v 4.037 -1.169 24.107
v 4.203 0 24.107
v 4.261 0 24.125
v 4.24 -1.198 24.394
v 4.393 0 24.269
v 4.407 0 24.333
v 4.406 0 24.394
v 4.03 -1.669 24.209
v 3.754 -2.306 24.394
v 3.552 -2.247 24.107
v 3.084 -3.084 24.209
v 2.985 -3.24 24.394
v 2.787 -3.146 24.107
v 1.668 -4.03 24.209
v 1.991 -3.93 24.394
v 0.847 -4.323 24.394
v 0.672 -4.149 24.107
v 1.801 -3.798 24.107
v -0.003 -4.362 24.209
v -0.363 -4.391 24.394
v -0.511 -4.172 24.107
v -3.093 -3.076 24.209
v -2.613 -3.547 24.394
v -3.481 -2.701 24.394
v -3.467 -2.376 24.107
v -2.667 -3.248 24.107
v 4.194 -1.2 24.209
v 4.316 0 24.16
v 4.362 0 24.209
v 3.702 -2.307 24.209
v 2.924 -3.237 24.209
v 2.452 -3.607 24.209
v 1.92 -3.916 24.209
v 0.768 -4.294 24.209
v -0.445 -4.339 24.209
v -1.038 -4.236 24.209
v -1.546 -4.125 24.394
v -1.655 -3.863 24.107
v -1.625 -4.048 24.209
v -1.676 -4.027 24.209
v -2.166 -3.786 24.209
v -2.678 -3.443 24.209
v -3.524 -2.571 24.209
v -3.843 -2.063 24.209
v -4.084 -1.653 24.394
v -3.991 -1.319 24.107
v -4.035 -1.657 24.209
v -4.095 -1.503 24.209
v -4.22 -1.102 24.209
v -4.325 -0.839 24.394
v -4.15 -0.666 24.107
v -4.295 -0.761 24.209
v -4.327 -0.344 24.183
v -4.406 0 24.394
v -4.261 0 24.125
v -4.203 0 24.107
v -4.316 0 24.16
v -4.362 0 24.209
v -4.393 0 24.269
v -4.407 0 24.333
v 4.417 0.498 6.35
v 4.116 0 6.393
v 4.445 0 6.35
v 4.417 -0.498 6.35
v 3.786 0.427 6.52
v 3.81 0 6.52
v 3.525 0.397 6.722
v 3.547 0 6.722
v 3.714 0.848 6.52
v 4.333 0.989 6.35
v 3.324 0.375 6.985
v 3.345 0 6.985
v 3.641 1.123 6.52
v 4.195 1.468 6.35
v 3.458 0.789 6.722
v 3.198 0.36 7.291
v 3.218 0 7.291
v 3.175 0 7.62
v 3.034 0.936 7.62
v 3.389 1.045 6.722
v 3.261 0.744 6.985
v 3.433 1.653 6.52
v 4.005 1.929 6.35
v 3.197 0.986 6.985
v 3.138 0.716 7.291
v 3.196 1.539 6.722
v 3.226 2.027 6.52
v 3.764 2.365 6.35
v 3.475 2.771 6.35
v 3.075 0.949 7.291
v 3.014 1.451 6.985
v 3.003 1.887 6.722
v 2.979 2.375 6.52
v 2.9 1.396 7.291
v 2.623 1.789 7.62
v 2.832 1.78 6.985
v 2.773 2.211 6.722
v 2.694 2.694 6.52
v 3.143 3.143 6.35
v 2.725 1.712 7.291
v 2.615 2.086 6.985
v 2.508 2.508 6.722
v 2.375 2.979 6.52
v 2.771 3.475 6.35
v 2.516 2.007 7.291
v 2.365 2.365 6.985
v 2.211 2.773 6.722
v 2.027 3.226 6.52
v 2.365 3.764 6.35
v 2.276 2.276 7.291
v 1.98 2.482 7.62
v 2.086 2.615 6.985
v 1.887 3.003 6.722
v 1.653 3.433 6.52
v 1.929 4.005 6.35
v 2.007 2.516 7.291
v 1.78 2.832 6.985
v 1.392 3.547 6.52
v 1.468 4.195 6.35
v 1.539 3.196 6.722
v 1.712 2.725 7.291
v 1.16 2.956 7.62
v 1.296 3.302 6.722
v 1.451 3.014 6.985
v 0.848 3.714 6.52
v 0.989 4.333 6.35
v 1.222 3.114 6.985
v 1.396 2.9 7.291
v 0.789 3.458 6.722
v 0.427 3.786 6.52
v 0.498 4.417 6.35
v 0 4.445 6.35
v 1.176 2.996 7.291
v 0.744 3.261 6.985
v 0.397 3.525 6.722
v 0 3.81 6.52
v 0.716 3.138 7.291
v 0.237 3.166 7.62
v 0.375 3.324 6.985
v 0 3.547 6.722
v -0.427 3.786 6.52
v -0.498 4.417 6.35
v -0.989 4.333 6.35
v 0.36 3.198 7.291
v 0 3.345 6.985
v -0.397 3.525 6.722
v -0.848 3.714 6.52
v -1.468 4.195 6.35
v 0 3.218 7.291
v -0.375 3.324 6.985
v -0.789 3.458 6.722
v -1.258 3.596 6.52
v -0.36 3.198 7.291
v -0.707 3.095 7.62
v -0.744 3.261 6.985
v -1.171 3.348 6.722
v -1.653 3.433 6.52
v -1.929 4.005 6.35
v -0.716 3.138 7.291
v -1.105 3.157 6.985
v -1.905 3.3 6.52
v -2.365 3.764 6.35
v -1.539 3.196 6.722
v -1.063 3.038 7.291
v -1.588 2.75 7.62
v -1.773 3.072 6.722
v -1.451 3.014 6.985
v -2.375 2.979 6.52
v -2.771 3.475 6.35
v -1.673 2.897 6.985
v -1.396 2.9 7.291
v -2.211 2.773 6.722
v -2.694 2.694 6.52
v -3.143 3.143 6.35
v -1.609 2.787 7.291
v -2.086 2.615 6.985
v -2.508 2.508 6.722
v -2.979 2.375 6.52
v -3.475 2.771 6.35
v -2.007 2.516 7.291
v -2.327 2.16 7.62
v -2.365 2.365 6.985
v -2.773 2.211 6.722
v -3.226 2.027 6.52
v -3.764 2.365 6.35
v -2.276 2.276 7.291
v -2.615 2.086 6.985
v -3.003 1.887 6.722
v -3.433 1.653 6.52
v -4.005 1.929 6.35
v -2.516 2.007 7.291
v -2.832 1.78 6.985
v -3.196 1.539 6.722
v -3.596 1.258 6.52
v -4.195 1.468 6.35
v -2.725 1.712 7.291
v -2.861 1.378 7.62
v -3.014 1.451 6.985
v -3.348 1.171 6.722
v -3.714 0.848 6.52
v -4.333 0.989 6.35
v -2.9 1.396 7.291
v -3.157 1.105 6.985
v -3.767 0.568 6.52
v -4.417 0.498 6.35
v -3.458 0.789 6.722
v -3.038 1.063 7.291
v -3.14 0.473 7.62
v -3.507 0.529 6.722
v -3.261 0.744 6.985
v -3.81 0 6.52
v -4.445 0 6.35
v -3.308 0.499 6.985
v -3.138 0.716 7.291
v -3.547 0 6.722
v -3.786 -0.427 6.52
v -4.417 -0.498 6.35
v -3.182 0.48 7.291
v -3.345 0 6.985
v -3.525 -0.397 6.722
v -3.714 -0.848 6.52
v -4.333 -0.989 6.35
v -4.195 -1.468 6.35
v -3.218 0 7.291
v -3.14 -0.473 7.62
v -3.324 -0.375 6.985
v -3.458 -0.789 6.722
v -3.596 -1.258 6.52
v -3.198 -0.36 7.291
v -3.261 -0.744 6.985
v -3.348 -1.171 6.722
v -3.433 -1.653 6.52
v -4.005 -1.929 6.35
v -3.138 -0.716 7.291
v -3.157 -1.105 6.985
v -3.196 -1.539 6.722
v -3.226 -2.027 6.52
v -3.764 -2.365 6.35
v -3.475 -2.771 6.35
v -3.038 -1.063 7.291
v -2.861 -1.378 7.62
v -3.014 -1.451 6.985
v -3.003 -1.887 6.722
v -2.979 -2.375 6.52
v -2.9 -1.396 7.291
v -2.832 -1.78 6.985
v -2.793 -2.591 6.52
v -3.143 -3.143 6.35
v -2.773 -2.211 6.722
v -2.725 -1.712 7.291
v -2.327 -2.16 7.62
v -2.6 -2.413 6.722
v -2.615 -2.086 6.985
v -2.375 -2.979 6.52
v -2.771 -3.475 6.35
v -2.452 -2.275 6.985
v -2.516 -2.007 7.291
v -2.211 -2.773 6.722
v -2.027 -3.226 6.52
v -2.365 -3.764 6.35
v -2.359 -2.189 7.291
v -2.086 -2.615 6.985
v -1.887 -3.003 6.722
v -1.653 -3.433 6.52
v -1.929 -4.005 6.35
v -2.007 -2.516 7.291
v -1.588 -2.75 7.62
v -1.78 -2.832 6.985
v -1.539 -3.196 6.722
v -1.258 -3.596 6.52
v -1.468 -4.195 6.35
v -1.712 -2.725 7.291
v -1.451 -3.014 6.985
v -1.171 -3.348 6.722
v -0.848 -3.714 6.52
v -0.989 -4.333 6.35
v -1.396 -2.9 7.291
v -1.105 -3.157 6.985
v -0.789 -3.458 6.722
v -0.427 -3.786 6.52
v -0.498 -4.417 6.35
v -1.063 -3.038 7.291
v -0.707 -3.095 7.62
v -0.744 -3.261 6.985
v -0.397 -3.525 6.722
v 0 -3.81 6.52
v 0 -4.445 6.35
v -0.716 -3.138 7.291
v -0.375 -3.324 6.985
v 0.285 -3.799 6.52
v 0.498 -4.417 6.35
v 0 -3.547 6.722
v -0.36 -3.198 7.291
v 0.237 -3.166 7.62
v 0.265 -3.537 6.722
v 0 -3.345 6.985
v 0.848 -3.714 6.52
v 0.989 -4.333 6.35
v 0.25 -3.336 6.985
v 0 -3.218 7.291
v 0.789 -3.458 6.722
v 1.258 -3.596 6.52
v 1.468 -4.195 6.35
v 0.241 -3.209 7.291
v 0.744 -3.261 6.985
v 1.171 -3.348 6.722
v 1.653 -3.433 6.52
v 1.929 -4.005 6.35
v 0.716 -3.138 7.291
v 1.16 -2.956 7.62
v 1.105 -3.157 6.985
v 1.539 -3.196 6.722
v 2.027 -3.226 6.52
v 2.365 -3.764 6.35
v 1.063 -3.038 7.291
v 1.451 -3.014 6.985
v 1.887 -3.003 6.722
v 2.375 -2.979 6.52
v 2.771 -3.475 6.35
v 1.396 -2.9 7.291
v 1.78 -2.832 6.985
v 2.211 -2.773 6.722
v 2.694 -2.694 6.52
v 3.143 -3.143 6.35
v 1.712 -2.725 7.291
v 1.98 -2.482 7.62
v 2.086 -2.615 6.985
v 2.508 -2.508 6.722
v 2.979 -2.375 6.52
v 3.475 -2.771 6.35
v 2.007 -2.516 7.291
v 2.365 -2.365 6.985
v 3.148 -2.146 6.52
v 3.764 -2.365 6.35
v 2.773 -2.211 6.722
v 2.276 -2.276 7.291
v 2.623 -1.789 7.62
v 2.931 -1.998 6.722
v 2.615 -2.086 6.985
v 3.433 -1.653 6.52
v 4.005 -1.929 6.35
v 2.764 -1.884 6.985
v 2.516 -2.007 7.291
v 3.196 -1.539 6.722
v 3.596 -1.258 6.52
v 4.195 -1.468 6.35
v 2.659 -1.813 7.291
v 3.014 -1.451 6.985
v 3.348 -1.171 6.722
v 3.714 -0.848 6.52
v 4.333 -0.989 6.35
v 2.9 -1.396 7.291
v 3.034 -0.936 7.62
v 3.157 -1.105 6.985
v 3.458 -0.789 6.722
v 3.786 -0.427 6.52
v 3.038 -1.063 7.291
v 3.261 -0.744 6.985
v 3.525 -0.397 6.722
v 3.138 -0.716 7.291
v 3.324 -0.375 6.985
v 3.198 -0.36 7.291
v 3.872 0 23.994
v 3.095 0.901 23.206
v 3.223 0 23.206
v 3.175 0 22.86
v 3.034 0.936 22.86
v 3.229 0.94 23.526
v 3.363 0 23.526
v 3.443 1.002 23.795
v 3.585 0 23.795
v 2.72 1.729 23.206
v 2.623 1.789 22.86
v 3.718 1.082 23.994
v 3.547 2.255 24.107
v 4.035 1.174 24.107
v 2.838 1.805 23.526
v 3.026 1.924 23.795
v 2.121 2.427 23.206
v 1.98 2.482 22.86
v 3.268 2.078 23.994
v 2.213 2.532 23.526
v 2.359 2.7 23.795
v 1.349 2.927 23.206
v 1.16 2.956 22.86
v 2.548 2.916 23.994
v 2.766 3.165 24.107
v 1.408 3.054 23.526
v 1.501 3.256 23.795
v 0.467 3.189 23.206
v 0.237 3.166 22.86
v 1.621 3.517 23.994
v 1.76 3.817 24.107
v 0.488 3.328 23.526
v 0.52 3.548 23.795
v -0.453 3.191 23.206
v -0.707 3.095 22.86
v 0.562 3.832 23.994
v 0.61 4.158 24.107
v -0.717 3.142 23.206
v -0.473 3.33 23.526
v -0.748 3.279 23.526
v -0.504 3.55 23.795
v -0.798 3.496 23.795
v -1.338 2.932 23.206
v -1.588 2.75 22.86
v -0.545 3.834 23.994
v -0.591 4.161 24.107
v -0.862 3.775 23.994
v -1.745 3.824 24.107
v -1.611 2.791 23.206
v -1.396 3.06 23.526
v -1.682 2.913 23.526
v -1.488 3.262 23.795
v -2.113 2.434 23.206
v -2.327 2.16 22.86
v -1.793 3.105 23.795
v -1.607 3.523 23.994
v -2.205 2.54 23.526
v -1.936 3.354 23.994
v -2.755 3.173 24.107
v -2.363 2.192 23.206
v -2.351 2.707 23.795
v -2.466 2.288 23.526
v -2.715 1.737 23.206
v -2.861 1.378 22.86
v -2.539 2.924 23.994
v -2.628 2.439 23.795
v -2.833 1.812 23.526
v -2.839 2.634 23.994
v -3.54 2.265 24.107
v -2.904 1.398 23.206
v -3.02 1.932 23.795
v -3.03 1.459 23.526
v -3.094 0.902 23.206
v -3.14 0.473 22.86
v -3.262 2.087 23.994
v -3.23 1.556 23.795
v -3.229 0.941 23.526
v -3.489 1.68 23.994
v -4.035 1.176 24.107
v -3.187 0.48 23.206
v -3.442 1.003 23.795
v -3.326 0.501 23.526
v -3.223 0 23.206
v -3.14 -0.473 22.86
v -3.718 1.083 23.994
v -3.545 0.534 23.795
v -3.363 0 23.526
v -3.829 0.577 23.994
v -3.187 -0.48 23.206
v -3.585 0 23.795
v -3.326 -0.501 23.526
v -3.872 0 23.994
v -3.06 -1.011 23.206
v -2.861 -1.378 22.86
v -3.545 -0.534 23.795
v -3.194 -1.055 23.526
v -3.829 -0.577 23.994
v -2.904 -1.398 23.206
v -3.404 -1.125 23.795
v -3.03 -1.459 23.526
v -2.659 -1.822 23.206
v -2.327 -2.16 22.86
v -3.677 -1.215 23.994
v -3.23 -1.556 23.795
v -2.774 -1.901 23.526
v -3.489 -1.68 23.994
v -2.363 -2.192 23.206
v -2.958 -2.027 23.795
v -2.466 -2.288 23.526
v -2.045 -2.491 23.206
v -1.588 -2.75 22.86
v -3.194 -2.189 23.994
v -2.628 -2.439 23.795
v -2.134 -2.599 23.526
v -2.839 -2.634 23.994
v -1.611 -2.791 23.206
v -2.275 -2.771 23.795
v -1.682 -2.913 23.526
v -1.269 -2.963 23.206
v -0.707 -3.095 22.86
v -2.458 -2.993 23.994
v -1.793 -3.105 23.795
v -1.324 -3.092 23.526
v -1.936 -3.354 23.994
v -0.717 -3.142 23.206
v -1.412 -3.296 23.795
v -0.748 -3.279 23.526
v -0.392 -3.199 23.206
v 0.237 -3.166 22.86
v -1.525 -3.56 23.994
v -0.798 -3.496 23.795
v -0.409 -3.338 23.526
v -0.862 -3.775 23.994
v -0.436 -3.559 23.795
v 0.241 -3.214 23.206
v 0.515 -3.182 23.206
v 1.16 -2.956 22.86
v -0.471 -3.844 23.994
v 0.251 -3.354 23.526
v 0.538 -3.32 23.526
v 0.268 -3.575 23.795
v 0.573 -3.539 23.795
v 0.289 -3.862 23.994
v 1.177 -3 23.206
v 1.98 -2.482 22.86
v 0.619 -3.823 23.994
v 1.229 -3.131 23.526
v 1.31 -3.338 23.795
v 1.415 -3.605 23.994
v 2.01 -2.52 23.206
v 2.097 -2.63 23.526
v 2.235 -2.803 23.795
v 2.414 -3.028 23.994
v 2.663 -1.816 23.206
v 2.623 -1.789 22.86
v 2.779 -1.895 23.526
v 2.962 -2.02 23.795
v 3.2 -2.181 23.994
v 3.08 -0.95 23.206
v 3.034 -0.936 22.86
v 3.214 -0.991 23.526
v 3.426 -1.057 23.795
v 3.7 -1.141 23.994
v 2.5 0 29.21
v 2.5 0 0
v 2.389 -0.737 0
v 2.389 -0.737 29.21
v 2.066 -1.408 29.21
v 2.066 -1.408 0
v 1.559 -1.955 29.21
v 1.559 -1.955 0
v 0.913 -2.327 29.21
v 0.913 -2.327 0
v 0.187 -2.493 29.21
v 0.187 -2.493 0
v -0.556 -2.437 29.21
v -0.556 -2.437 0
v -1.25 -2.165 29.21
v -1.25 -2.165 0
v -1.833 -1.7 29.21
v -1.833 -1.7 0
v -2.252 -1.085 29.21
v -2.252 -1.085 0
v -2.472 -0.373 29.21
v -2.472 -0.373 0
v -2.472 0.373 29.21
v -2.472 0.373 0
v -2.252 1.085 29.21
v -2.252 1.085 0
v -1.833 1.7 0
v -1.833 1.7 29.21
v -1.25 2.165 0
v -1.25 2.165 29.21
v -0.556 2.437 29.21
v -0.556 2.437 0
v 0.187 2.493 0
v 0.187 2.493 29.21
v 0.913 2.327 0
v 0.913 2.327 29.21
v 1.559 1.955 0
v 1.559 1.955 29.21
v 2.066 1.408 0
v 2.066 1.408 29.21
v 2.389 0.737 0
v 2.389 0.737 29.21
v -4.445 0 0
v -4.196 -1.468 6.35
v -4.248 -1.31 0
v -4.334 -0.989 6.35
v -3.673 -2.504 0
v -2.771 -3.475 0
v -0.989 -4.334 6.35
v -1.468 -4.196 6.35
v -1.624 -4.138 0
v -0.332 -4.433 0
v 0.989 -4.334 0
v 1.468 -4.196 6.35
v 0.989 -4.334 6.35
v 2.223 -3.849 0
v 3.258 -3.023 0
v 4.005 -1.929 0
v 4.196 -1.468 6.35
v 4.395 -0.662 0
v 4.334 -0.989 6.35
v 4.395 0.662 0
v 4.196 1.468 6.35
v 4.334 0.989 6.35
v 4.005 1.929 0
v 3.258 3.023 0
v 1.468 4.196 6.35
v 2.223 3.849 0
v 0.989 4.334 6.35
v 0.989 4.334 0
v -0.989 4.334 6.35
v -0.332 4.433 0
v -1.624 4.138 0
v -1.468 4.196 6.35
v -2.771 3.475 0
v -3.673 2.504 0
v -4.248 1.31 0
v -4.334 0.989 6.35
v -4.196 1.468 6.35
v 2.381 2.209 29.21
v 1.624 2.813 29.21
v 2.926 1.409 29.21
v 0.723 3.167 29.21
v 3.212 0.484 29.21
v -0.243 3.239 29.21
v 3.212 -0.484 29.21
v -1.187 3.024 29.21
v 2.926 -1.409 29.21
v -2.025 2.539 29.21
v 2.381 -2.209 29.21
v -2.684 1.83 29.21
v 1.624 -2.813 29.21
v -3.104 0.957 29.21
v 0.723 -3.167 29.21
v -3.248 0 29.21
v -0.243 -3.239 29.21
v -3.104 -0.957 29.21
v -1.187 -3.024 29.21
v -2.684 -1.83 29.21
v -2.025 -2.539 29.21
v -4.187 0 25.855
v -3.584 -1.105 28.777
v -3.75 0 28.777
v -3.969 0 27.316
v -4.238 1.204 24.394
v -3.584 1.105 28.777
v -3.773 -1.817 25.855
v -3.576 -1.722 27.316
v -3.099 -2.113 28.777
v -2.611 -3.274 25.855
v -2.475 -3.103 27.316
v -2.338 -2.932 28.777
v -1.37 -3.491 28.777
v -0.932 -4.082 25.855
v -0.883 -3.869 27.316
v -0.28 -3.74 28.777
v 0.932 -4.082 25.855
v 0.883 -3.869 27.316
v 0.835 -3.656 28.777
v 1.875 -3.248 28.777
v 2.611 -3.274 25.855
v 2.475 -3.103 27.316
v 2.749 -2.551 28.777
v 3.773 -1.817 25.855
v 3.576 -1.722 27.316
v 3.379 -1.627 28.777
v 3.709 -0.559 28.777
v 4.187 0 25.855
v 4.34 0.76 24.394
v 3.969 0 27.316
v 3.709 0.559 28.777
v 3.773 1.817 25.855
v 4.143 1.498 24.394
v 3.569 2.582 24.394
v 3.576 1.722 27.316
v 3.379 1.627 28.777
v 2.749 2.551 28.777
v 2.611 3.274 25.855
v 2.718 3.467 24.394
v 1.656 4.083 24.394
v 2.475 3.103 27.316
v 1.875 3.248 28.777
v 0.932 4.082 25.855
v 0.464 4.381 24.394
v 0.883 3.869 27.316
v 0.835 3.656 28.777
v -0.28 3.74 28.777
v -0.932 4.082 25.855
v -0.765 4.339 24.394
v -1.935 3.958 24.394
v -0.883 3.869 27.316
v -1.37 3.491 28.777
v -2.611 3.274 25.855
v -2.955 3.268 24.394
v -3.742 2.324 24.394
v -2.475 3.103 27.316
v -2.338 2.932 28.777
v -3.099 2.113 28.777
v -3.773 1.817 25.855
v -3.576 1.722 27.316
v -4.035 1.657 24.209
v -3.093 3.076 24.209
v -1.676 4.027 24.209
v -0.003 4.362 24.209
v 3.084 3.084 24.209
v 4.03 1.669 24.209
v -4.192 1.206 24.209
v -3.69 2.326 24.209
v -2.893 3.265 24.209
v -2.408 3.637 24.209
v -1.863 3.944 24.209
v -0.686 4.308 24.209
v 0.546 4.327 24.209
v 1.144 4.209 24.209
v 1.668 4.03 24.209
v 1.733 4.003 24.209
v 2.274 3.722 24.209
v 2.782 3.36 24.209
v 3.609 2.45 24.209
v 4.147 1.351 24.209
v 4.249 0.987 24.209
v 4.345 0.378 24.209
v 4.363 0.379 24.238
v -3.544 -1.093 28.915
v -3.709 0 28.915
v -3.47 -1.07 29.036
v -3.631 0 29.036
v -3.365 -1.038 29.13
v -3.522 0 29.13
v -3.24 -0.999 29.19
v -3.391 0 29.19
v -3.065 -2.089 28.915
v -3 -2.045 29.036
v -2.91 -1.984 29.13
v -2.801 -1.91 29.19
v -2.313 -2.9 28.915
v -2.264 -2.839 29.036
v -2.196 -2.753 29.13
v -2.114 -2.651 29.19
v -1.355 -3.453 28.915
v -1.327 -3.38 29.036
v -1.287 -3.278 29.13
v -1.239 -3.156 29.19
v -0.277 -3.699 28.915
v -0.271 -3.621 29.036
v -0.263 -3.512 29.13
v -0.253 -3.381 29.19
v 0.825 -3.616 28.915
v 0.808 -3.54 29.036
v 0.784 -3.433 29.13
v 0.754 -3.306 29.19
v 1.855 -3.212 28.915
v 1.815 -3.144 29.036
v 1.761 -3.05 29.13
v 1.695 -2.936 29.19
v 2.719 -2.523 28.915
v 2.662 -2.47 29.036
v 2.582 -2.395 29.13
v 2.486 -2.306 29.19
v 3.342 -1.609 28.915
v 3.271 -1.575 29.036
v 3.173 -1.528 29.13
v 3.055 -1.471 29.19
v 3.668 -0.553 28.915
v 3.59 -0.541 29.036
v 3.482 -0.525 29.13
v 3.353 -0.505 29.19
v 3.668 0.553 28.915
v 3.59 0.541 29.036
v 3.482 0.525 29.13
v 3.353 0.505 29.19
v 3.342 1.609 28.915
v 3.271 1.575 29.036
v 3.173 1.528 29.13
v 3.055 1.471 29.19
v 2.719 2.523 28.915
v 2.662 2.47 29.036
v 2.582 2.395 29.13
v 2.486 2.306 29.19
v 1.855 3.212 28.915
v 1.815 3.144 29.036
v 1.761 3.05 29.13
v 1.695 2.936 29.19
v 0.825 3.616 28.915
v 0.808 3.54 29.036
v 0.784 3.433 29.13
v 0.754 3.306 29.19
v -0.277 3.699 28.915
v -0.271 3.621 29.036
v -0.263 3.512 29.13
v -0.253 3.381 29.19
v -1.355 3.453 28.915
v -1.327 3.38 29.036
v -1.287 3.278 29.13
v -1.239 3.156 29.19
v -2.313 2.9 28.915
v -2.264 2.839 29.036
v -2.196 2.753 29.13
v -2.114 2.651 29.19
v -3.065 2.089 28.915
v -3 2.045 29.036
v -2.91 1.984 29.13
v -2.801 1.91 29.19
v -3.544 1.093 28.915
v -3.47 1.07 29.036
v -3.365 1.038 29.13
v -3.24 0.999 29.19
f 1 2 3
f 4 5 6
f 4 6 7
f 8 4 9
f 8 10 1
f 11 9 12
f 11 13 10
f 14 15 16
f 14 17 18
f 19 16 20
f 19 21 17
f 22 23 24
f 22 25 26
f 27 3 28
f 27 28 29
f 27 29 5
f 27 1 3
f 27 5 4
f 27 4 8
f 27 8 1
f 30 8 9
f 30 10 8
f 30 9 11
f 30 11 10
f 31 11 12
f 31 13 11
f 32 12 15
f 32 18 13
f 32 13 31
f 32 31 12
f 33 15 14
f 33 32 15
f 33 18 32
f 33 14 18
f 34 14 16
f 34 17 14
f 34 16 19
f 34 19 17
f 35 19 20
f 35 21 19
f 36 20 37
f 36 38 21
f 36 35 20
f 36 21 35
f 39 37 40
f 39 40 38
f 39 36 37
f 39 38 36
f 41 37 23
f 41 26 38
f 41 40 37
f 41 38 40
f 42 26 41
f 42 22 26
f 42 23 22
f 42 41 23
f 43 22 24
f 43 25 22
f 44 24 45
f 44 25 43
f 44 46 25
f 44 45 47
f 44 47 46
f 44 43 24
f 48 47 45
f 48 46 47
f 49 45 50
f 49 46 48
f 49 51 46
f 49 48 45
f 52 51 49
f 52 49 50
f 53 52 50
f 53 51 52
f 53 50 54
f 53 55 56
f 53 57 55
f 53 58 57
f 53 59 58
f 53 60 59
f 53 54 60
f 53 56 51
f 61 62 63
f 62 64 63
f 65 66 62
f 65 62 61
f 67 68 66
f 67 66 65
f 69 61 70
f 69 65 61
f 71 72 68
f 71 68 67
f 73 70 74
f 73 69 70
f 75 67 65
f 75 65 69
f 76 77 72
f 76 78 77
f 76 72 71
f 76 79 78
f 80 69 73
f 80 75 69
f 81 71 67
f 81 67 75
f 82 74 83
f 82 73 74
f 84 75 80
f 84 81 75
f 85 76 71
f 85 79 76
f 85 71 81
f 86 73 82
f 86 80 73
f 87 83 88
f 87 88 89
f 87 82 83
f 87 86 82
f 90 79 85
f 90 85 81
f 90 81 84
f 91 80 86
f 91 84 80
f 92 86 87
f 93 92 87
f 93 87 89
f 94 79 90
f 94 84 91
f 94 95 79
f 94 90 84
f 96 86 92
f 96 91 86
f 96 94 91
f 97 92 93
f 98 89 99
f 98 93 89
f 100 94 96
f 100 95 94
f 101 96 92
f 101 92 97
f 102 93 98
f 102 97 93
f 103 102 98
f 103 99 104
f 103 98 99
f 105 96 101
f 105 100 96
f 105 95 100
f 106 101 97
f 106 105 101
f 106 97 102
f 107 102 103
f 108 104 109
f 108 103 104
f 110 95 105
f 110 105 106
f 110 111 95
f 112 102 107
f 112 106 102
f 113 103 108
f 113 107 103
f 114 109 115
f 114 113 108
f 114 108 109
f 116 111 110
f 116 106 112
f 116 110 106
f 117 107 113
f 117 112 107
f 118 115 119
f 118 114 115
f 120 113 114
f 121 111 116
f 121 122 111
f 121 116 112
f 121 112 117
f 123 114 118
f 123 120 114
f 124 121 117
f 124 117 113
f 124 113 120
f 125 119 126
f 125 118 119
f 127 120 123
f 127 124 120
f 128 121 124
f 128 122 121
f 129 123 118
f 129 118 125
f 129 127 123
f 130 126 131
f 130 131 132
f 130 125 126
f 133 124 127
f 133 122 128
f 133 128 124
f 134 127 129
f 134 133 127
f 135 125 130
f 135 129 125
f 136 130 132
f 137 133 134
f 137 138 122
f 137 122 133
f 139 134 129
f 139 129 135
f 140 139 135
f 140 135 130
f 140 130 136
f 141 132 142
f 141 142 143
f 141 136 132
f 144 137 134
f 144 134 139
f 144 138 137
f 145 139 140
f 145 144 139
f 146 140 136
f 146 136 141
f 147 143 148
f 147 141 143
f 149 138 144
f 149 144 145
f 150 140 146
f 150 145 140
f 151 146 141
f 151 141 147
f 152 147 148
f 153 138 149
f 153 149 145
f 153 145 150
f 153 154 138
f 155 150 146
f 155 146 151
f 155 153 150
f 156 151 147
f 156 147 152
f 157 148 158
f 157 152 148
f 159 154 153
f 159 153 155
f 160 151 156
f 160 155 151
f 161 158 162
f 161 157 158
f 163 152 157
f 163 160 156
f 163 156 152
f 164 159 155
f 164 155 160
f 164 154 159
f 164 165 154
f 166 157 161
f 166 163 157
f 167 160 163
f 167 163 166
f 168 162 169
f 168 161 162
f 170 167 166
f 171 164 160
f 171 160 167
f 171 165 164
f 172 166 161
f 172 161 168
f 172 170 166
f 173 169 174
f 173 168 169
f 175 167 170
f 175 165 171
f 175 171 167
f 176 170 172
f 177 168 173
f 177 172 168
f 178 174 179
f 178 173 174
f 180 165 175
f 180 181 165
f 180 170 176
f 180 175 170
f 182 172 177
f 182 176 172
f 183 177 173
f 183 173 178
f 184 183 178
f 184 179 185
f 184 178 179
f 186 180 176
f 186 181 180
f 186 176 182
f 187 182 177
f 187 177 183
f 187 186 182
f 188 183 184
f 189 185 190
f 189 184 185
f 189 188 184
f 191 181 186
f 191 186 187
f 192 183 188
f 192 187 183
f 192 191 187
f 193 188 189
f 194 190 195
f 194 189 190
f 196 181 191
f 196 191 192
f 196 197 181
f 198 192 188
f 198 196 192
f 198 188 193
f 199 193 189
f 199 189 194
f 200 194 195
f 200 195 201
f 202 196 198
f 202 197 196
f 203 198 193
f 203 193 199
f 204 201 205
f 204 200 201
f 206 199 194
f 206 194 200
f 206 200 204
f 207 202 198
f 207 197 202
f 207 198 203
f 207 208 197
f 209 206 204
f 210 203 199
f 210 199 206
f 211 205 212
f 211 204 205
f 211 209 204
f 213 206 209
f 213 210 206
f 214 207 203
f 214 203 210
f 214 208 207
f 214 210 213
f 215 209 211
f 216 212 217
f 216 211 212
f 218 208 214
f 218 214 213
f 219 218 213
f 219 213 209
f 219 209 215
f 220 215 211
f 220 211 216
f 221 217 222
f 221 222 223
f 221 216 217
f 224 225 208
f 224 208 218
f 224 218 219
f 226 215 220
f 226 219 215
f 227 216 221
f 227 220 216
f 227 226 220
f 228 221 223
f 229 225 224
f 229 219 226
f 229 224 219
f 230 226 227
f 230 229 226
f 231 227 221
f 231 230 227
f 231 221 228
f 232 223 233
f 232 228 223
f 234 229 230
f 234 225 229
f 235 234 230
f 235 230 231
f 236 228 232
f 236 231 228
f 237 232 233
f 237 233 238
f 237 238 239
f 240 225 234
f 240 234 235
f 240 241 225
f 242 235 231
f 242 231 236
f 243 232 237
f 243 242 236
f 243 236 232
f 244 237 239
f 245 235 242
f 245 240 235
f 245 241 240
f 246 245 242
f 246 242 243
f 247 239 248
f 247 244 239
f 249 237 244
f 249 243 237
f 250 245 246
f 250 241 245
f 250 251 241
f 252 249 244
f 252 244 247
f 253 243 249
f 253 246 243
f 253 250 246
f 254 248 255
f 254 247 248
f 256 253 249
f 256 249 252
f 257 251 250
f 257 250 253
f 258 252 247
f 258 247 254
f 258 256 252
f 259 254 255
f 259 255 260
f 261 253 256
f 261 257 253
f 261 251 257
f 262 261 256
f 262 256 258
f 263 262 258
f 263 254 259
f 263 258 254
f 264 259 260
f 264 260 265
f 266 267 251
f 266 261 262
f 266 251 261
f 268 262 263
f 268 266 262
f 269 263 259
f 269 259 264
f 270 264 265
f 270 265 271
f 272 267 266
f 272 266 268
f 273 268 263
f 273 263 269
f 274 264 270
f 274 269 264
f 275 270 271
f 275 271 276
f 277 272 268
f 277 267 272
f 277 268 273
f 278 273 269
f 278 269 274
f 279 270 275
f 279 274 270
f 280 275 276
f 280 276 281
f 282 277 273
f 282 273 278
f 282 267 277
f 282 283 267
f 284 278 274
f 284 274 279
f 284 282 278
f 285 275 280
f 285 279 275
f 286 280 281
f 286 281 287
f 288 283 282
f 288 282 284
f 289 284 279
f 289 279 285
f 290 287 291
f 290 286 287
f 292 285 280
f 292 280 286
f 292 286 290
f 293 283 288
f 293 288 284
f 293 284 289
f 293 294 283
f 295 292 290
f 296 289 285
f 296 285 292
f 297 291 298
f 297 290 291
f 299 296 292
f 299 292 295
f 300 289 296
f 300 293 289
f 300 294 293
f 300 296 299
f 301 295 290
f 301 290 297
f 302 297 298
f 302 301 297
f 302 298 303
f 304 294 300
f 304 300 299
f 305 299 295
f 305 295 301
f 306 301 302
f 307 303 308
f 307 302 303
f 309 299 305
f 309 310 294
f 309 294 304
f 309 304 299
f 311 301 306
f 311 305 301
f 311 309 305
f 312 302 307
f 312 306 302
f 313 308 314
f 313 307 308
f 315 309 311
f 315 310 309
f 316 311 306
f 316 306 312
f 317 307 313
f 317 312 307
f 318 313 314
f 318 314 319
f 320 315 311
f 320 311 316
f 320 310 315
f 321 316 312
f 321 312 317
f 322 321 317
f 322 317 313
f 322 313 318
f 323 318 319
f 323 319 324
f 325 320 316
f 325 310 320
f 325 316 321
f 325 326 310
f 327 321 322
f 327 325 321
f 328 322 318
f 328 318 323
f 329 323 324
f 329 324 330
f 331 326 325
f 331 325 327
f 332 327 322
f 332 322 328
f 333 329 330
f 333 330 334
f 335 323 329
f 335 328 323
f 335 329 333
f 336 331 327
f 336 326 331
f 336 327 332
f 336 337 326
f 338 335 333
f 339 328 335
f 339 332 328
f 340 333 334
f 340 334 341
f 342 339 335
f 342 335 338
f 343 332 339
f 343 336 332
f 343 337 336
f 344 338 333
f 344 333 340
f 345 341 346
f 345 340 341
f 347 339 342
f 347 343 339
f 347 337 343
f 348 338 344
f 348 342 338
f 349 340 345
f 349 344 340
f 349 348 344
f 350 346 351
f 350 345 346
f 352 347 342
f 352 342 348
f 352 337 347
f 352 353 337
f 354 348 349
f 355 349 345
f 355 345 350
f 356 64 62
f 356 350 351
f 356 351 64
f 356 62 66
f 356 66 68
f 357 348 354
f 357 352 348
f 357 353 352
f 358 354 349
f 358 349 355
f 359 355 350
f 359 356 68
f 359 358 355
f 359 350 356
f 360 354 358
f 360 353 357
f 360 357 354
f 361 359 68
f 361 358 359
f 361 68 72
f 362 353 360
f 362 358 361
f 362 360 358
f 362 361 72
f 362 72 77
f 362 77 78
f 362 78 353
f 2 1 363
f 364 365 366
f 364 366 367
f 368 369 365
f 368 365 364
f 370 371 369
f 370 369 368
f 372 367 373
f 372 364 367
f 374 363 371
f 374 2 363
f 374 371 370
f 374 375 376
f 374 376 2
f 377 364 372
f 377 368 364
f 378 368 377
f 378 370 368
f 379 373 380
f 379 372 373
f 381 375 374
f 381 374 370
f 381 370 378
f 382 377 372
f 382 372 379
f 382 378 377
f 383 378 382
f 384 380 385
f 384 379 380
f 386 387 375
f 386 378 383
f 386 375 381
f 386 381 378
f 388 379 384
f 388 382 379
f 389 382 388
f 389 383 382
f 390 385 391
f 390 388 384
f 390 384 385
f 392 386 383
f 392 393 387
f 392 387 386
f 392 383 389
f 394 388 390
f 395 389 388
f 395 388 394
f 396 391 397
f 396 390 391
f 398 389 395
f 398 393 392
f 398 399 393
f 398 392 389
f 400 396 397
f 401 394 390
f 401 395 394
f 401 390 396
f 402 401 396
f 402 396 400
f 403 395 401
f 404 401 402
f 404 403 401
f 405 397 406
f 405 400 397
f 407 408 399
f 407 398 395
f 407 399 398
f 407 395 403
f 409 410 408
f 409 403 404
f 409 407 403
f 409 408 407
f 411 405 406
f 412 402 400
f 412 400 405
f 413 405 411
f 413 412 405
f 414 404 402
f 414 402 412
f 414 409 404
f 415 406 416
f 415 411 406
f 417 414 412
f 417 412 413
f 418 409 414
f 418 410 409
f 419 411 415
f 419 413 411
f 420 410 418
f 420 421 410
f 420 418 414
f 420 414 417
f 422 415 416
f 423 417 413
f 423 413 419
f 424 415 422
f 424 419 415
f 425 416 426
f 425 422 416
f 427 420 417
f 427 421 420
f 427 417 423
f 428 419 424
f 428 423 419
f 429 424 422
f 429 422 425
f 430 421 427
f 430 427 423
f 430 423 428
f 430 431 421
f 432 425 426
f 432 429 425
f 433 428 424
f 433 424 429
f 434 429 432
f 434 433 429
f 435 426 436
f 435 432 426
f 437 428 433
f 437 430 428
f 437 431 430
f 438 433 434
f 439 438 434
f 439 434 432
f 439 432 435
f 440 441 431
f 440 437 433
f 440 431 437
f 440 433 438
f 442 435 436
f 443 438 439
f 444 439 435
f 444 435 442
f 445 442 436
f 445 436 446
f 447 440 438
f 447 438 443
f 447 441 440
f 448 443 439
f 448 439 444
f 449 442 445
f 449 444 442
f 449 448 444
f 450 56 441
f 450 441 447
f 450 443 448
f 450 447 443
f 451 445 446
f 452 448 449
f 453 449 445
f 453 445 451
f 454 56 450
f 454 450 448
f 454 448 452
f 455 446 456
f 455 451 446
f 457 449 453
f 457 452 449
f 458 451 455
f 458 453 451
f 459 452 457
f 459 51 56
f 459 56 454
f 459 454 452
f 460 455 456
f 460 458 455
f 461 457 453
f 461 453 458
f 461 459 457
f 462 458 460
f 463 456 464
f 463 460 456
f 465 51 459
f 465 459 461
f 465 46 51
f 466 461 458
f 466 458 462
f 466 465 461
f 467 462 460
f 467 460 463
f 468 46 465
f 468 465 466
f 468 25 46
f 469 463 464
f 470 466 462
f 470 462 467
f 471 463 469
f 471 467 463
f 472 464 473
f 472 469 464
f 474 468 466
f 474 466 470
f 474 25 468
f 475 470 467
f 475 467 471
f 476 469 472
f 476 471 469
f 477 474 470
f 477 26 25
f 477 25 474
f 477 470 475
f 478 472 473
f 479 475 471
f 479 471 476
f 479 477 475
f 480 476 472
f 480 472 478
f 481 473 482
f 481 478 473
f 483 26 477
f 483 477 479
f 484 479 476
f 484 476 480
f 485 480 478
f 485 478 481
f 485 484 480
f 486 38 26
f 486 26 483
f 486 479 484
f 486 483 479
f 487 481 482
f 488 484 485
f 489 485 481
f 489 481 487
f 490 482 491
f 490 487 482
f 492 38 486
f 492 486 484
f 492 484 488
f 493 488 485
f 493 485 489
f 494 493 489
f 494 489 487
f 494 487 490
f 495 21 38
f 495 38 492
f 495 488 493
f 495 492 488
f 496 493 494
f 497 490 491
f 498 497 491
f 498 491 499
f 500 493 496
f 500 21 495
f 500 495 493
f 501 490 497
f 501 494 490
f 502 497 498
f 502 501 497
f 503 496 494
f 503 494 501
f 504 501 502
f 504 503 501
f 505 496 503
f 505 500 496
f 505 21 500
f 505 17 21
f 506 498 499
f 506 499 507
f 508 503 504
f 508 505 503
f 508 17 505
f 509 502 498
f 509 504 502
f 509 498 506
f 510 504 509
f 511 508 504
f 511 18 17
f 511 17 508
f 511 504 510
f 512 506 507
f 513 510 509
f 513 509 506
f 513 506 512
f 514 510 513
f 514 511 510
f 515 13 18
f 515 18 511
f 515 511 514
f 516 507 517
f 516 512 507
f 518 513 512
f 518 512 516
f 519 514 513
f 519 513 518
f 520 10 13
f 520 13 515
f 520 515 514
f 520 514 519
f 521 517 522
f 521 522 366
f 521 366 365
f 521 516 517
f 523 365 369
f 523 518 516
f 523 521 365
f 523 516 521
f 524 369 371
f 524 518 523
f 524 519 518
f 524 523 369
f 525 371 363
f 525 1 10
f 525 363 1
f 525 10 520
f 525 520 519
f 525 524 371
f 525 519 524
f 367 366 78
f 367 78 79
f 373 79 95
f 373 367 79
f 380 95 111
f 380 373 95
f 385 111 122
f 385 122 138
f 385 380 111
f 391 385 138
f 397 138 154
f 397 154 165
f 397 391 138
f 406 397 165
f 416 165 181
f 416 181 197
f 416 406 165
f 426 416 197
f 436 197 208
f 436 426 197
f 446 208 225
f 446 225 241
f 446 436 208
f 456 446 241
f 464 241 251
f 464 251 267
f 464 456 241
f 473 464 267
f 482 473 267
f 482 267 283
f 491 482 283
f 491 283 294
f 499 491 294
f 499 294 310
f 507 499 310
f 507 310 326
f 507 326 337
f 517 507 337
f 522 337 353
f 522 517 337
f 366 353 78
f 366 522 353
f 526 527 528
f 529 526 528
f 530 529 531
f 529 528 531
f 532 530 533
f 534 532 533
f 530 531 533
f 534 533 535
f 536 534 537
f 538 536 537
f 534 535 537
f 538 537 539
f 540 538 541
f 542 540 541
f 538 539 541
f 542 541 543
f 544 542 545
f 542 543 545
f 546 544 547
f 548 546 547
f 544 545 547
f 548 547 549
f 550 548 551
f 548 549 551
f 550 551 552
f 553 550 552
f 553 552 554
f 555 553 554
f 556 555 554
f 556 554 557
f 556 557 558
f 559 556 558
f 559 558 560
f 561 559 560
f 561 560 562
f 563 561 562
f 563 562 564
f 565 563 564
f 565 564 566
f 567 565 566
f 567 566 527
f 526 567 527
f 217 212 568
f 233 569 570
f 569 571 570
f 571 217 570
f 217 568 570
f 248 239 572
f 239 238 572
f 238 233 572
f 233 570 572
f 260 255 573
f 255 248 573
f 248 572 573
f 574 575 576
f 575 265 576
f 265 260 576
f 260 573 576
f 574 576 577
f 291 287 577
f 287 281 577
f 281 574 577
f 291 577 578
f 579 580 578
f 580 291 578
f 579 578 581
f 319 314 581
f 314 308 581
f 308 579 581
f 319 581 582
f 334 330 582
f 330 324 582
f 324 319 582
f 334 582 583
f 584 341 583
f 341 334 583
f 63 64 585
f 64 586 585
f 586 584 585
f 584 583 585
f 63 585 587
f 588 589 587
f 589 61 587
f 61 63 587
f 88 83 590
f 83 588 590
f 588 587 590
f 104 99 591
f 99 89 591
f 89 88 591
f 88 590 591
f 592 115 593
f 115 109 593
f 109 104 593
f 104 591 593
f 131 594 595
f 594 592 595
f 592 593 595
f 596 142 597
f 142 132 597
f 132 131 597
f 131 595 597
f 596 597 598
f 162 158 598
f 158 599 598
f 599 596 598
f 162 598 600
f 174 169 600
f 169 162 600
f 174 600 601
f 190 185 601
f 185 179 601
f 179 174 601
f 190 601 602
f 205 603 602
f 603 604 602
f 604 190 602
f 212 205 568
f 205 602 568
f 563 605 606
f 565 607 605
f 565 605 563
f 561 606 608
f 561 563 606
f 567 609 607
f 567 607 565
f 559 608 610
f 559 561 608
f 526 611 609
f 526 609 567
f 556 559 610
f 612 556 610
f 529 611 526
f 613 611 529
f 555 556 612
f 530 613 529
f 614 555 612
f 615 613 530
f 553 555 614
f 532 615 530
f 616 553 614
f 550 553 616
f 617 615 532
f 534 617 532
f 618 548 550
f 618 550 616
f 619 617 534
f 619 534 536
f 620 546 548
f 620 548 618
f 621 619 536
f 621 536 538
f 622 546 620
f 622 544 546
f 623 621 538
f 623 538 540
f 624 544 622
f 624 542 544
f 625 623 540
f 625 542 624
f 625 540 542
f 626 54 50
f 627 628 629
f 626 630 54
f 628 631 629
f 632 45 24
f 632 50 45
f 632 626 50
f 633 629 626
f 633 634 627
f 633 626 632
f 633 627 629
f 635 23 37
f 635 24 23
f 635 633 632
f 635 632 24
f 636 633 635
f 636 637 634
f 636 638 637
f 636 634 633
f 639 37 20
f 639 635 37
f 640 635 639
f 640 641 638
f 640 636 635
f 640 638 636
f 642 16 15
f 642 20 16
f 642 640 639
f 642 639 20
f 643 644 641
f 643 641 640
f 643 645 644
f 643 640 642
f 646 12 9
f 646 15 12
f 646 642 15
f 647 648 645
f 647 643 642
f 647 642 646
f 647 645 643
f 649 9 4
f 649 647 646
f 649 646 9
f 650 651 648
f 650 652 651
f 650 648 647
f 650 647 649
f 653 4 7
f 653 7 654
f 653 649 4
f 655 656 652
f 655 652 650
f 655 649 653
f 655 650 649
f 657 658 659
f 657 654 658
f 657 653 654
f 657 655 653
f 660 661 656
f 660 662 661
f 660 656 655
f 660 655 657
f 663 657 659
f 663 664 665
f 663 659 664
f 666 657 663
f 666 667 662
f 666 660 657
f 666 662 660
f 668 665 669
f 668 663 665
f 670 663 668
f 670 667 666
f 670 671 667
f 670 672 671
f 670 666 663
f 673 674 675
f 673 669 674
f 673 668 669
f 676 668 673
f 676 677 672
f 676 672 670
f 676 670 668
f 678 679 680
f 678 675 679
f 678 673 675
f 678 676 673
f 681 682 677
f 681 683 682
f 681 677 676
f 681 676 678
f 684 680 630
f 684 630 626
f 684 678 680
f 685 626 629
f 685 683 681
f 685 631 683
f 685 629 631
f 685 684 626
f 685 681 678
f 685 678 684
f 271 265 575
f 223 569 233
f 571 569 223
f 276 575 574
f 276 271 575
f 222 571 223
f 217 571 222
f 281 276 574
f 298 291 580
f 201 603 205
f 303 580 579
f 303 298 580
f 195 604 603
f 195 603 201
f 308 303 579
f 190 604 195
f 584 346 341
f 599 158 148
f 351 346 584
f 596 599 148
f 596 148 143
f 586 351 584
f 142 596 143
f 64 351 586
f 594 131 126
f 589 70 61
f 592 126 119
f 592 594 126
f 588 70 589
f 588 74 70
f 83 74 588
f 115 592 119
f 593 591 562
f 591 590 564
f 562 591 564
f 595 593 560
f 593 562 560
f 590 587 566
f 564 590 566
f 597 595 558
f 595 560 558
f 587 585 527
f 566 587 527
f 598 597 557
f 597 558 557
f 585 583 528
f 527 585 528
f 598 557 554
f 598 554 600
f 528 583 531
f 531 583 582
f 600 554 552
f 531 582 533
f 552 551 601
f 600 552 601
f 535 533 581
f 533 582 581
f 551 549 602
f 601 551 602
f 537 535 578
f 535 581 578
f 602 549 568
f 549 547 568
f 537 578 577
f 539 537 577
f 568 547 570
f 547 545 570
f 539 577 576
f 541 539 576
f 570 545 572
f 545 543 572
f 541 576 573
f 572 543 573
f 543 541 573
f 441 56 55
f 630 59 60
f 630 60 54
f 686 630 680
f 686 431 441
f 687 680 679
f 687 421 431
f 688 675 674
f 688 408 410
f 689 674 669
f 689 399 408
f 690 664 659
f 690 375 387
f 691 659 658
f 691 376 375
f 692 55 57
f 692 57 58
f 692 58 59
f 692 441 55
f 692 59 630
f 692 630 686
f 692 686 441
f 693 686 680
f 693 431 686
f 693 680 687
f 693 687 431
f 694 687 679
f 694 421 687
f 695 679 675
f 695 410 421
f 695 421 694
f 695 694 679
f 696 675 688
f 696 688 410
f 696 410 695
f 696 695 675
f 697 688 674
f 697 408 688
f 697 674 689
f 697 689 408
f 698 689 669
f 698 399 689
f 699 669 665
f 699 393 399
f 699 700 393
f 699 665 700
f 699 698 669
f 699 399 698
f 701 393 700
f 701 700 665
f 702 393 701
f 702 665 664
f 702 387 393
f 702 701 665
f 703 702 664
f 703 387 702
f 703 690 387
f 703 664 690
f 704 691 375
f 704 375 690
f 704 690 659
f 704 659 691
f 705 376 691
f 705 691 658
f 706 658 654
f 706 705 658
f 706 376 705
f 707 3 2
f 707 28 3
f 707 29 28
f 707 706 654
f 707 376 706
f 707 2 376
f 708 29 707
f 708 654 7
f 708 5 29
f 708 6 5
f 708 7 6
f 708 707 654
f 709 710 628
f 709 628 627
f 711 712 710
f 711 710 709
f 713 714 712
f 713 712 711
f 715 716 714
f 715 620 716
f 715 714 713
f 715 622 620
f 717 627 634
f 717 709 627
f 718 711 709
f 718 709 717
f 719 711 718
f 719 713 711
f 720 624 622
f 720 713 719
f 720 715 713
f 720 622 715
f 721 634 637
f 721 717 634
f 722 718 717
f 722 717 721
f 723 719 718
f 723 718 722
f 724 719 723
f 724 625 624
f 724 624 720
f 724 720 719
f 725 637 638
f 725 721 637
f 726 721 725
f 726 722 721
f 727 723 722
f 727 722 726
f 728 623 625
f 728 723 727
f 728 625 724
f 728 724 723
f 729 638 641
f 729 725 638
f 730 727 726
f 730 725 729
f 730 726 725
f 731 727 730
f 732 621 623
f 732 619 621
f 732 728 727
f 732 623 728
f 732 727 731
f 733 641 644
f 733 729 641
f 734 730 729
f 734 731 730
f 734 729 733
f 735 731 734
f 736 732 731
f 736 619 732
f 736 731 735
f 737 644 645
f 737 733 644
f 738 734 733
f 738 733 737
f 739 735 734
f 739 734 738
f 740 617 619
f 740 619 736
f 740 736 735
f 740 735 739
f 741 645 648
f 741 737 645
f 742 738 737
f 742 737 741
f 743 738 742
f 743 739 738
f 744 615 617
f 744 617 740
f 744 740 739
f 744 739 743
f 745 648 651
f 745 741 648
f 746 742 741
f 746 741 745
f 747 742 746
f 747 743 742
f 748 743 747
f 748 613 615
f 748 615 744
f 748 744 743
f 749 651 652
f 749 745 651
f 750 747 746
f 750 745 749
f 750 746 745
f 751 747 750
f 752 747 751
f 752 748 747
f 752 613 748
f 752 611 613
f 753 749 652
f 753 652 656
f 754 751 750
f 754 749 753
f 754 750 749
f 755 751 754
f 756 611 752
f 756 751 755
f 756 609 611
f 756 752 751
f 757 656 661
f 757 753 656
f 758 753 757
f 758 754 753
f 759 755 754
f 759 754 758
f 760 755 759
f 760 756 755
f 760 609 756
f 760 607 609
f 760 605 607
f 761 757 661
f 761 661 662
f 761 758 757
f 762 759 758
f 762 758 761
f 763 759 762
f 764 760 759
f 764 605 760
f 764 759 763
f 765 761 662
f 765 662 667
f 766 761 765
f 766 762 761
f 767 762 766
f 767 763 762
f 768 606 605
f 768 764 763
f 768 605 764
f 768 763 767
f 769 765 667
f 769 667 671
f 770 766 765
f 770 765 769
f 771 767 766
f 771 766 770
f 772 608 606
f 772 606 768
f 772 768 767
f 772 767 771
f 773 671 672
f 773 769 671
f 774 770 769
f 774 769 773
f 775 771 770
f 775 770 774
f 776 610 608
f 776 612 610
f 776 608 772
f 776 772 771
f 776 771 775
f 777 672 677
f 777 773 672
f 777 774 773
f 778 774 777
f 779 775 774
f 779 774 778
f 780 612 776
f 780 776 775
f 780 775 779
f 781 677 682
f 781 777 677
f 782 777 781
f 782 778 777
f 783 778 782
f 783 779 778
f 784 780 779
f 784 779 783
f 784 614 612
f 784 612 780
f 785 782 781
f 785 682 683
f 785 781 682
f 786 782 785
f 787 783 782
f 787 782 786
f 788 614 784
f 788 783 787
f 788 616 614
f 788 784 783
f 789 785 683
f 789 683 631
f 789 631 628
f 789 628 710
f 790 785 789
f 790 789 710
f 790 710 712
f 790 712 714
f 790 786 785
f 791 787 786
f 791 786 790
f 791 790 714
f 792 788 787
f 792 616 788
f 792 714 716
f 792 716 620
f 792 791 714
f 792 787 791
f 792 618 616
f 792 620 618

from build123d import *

# Parameters (mm, degrees)
SKETCH1_R           = 4.445
BOSS_EXTRUDE1_DEPTH = 29.21
SKETCH2_R           = 2.5
CUT_EXTRUDE1_START  = -5.08
SKETCH3_R           = 6.35
SKETCH3_R_2         = 3.175
CUT_EXTRUDE1_DEPTH  = 17.78
FILLET1_R           = 1.27
FILLET2_R           = 1.27
CHAMFER1_SIZE       = 5.08
CHAMFER1_SIZE_2     = 0.759211087
FILLET3_R           = 0.254
FILLET4_R           = 0.508


# Some blends are built 0.0001 mm under size
with BuildPart() as part:
    # Sketch1 → Boss-Extrude1 (new body)
    with BuildSketch(Plane.XY):
        with Locations(Location((0, 0, 0), (0, 0, 180))):
            Circle(SKETCH1_R)
    extrude(amount=BOSS_EXTRUDE1_DEPTH)

    # Cut-Sweep1: sweep along a curve in space
    with BuildLine() as cut_sweep1_path:
        Line((0, 0, 29.21), (0, 0, 0))
    # Sketch2 → Cut-Sweep1 (sweep, cut)
    with BuildSketch(Plane.XY.offset(29.21)):
        Circle(SKETCH2_R)
    sweep(path=cut_sweep1_path.line, mode=Mode.SUBTRACT)

    # Sketch3 → Cut-Extrude1 (cut)
    with BuildSketch(Plane.XY.offset(29.21).offset(CUT_EXTRUDE1_START)):
        Circle(SKETCH3_R)
        Circle(SKETCH3_R_2, mode=Mode.SUBTRACT)
    extrude(amount=-CUT_EXTRUDE1_DEPTH, mode=Mode.SUBTRACT)

    # Fillet1
    fillet1_edges = [part.edges().sort_by_distance(p)[0] for p in [
        (-3.175, 0, 6.35),
    ]]
    fillet(fillet1_edges, radius=FILLET1_R - 0.0001)  # a hair under: the kernel refuses the full size

    # Fillet2
    fillet2_edges = [part.edges().sort_by_distance(p)[0] for p in [
        (-3.175, 0, 24.13),
    ]]
    fillet(fillet2_edges, radius=FILLET2_R - 0.0001)  # a hair under: the kernel refuses the full size

    # Chamfer1
    # the kernel refuses this chamfer: 5.08, 0.759211087 mm, written as the material it takes off along each edge
    with BuildSketch(Plane(origin=(0, 0, 29.21), x_dir=(-1, 0, 0), z_dir=(0, 1, 0))) as chamfer1_piece_1:
        Polygon((4.445, -CHAMFER1_SIZE), (4.445 - CHAMFER1_SIZE_2, 0), (4.445, 0), align=None)
    revolve(axis=Axis((0, 0, 29.21), (0, 0, 1)), mode=Mode.SUBTRACT)

    # Fillet3
    fillet3_edges = [part.edges().sort_by_distance(p)[0] for p in [
        (4.445, 0, 24.13),
    ]]
    fillet(fillet3_edges, radius=FILLET3_R)

    # Fillet4
    fillet4_edges = [part.edges().sort_by_distance(p)[0] for p in [
        (3.685788913, 0, 29.21),
    ]]
    fillet(fillet4_edges, radius=FILLET4_R)


solid = part.part
